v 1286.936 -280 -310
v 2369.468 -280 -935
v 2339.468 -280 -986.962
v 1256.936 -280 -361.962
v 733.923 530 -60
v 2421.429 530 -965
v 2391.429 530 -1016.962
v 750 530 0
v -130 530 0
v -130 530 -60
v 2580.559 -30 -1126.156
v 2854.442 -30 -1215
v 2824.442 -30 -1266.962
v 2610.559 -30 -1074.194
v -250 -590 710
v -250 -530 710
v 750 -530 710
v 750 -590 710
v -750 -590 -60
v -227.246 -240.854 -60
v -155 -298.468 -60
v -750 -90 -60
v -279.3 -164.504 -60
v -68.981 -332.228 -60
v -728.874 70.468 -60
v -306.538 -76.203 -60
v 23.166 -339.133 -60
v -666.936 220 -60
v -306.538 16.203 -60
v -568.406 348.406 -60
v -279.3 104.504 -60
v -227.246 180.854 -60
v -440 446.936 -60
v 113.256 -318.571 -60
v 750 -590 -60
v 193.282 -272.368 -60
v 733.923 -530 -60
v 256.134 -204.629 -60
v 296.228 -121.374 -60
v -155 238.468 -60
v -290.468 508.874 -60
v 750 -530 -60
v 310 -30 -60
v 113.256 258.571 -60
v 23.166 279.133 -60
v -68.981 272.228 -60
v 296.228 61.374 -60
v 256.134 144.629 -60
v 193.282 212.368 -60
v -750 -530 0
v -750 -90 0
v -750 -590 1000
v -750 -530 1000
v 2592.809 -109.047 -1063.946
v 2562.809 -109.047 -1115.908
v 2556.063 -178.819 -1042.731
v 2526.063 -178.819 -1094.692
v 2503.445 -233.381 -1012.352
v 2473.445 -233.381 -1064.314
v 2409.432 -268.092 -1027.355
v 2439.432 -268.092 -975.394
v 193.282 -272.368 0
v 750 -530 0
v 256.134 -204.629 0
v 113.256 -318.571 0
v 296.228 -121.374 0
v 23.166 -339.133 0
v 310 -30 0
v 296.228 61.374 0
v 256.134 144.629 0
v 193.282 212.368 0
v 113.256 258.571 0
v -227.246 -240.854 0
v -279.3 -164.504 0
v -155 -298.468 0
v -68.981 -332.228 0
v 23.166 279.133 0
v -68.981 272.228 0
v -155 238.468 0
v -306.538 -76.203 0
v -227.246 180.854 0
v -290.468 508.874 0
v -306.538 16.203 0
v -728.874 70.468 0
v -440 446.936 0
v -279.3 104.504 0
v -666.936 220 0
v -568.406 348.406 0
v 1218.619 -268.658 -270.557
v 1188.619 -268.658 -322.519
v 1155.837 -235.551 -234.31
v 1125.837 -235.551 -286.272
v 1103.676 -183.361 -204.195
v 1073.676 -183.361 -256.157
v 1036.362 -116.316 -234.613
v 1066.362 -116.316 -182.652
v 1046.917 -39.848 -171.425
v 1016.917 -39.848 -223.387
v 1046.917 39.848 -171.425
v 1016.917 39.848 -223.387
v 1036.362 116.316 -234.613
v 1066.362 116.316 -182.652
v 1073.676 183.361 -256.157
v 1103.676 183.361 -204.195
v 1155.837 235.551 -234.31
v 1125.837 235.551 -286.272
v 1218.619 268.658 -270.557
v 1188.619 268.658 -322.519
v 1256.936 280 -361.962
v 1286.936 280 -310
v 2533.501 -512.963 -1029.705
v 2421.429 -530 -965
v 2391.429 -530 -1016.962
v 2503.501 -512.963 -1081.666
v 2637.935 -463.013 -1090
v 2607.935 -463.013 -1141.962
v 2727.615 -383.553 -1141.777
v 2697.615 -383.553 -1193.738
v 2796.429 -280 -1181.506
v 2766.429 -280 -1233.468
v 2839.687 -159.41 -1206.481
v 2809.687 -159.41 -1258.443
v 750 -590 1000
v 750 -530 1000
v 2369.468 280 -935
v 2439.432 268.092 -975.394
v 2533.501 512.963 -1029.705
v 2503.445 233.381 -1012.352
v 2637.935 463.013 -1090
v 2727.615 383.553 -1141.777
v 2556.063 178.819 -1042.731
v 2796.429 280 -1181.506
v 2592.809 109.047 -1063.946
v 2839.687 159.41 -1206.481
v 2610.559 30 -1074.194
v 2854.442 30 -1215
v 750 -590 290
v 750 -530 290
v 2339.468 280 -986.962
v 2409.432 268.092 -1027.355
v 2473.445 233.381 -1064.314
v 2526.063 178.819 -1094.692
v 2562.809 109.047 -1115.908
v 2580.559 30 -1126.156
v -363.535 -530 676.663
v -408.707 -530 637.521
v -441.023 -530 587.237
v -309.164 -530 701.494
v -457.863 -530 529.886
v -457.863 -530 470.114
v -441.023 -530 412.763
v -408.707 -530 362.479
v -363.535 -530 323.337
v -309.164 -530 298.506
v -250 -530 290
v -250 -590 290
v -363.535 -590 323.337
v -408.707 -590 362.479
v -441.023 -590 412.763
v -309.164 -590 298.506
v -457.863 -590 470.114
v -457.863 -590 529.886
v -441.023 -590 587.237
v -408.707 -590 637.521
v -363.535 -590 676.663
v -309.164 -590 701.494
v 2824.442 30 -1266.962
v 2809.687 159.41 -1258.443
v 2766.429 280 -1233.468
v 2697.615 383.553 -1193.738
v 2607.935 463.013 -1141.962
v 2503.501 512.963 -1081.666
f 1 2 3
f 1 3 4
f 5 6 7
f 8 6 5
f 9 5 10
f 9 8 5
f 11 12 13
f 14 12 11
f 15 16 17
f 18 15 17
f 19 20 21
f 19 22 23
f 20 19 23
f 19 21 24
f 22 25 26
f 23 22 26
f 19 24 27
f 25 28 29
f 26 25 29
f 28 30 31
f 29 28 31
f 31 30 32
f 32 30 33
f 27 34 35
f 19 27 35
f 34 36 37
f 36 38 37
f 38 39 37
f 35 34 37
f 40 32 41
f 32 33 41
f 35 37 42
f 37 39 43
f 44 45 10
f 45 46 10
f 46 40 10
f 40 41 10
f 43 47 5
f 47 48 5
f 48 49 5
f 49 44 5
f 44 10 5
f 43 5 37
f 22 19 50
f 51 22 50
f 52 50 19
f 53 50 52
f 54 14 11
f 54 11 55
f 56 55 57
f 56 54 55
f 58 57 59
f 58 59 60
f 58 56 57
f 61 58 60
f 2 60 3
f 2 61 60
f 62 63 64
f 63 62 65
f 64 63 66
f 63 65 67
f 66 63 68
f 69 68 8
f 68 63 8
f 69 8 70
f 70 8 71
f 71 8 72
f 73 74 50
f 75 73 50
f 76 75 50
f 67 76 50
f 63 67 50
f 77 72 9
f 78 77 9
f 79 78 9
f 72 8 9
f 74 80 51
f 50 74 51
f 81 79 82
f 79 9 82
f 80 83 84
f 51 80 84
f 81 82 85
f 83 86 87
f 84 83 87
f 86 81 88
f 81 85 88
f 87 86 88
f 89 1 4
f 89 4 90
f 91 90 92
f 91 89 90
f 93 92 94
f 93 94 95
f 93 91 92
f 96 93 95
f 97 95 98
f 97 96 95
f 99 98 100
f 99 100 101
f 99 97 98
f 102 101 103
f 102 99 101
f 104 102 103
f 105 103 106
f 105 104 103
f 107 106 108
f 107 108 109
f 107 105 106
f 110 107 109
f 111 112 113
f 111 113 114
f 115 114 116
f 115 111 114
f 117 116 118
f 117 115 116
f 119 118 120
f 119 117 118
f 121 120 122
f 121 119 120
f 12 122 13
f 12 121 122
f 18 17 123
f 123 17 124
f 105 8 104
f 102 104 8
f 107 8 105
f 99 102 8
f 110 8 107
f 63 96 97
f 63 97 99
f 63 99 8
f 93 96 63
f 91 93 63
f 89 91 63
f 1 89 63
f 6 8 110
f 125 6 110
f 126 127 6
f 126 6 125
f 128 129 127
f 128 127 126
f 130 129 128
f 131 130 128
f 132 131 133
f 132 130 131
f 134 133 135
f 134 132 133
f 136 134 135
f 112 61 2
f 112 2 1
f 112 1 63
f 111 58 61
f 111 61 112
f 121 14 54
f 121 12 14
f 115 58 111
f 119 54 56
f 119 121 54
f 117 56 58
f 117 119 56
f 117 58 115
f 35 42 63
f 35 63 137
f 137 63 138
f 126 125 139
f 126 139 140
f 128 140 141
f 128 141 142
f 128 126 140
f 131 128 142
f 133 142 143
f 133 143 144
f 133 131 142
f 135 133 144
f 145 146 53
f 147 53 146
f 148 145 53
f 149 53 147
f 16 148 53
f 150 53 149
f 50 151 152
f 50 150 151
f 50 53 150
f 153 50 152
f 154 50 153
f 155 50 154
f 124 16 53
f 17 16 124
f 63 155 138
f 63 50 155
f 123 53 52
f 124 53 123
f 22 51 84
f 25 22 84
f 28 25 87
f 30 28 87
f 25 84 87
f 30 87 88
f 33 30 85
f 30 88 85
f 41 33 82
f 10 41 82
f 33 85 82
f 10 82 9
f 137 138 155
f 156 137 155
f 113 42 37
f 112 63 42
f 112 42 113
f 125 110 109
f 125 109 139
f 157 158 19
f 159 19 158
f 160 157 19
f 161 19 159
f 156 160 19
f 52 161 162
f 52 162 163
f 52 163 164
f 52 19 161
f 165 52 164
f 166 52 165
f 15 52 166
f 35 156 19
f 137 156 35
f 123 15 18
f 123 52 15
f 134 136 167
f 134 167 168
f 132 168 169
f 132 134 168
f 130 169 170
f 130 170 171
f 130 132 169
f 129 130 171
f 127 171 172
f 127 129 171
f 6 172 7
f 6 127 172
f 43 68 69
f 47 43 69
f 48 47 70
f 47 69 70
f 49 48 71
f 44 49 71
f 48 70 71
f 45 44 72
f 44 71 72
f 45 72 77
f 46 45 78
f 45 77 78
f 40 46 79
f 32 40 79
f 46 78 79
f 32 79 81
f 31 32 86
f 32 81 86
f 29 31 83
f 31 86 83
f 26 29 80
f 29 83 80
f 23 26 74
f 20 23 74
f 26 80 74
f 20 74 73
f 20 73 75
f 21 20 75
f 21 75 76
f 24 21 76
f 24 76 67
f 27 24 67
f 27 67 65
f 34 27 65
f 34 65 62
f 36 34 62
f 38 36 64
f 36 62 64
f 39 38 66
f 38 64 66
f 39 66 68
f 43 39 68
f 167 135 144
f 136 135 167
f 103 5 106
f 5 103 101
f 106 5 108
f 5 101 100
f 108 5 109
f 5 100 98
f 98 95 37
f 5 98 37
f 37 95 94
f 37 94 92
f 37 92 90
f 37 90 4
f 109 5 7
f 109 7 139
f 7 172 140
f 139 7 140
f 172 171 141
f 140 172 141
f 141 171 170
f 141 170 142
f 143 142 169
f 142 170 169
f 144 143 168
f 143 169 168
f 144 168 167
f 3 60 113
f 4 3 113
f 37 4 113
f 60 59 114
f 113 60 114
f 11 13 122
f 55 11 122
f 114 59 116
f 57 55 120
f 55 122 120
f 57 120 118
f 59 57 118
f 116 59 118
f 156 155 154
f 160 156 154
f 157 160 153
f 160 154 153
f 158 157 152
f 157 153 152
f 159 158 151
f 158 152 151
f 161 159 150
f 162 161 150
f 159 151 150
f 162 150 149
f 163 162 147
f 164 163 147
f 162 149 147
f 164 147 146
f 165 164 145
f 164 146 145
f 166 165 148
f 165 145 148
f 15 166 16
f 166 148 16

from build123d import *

# Parameters (mm, degrees)
SKETCH1_W           = 1500
SKETCH1_H           = 60
BOSS_EXTRUDE1_DEPTH = 1000
SKETCH1_6_R         = 310
BOSS_EXTRUDE2_DEPTH = 60
SKETCH4_W           = 1500
SKETCH4_H           = 60
BOSS_EXTRUDE3_DEPTH = 60
CUT_EXTRUDE2_DEPTH  = 60
BOSS_EXTRUDE4_DEPTH = 60


with BuildPart() as part:
    # Sketch1 → Boss-Extrude1 (new body)
    with BuildSketch(Plane.XY):
        with Locations((0, -560)):
            Rectangle(SKETCH1_W, SKETCH1_H)
    extrude(amount=BOSS_EXTRUDE1_DEPTH)



with BuildPart() as body_2:
    # Sketch1<6> → Boss-Extrude2 (new body)
    with BuildSketch(Plane.XY):
        with BuildLine():
            Line((750, 530), (-130, 530))
            ThreePointArc((-130, 530), (-568.406204336, 348.406204336), (-750, -90))
            Line((-750, -90), (-750, -530))
            Line((-750, -530), (750, -530))
            Line((750, -530), (750, 530))
        make_face()
        with Locations((0, -30)):
            Circle(SKETCH1_6_R, mode=Mode.SUBTRACT)
    extrude(amount=-BOSS_EXTRUDE2_DEPTH)


with BuildPart() as part_1:
    add(part.part)

    add(body_2.part)  # Boss-Extrude3 merges body 2
    # Sketch4 → Boss-Extrude3 (add)
    with BuildSketch(Plane.XZ.offset(530)):
        with Locations((0, -30)):
            Rectangle(SKETCH4_W, SKETCH4_H)
    extrude(amount=BOSS_EXTRUDE3_DEPTH)

    # Sketch5 → Cut-Extrude2 (cut)
    with BuildSketch(Plane(origin=(0, -530, 0), x_dir=(1, 0, 0), z_dir=(0, 1, 0))):
        with BuildLine():
            Line((-250, -710), (750, -710))
            Line((750, -710), (750, -290))
            Line((750, -290), (-250, -290))
            ThreePointArc((-250, -290), (-460, -500), (-250, -710))
        make_face()
    extrude(amount=-CUT_EXTRUDE2_DEPTH, mode=Mode.SUBTRACT)

    # Sketch6 → Boss-Extrude4 (add)
    with BuildSketch(Plane(origin=(187.5, 0, 324.759526419), x_dir=(0, 1, 0), z_dir=(-0.5000000000000071, -9.251858538543111e-15, -0.8660254037844346))):
        with BuildLine():
            Line((-530, 649.519052838), (530, 649.519052838))
            Line((530, 649.519052838), (530, 2579.519052838))
            ThreePointArc((530, 2579.519052838), (383.553390593, 2933.072443432), (30, 3079.519052838))
            Line((30, 3079.519052838), (30, 2797.90727098))
            ThreePointArc((30, 2797.90727098), (208.32666656, 2706.601922177), (280, 2519.519052838))
            Line((280, 2519.519052838), (280, 1269.519052838))
            ThreePointArc((280, 1269.519052838), (0, 989.519052838), (-280, 1269.519052838))
            Line((-280, 1269.519052838), (-280, 2519.519052838))
            ThreePointArc((-280, 2519.519052838), (-208.32666656, 2706.601922177), (-30, 2797.90727098))
            Line((-30, 2797.90727098), (-30, 3079.519052838))
            ThreePointArc((-30, 3079.519052838), (-383.553390593, 2933.072443432), (-530, 2579.519052838))
            Line((-530, 2579.519052838), (-530, 649.519052838))
        make_face()
    extrude(amount=BOSS_EXTRUDE4_DEPTH)


solid = part_1.part
